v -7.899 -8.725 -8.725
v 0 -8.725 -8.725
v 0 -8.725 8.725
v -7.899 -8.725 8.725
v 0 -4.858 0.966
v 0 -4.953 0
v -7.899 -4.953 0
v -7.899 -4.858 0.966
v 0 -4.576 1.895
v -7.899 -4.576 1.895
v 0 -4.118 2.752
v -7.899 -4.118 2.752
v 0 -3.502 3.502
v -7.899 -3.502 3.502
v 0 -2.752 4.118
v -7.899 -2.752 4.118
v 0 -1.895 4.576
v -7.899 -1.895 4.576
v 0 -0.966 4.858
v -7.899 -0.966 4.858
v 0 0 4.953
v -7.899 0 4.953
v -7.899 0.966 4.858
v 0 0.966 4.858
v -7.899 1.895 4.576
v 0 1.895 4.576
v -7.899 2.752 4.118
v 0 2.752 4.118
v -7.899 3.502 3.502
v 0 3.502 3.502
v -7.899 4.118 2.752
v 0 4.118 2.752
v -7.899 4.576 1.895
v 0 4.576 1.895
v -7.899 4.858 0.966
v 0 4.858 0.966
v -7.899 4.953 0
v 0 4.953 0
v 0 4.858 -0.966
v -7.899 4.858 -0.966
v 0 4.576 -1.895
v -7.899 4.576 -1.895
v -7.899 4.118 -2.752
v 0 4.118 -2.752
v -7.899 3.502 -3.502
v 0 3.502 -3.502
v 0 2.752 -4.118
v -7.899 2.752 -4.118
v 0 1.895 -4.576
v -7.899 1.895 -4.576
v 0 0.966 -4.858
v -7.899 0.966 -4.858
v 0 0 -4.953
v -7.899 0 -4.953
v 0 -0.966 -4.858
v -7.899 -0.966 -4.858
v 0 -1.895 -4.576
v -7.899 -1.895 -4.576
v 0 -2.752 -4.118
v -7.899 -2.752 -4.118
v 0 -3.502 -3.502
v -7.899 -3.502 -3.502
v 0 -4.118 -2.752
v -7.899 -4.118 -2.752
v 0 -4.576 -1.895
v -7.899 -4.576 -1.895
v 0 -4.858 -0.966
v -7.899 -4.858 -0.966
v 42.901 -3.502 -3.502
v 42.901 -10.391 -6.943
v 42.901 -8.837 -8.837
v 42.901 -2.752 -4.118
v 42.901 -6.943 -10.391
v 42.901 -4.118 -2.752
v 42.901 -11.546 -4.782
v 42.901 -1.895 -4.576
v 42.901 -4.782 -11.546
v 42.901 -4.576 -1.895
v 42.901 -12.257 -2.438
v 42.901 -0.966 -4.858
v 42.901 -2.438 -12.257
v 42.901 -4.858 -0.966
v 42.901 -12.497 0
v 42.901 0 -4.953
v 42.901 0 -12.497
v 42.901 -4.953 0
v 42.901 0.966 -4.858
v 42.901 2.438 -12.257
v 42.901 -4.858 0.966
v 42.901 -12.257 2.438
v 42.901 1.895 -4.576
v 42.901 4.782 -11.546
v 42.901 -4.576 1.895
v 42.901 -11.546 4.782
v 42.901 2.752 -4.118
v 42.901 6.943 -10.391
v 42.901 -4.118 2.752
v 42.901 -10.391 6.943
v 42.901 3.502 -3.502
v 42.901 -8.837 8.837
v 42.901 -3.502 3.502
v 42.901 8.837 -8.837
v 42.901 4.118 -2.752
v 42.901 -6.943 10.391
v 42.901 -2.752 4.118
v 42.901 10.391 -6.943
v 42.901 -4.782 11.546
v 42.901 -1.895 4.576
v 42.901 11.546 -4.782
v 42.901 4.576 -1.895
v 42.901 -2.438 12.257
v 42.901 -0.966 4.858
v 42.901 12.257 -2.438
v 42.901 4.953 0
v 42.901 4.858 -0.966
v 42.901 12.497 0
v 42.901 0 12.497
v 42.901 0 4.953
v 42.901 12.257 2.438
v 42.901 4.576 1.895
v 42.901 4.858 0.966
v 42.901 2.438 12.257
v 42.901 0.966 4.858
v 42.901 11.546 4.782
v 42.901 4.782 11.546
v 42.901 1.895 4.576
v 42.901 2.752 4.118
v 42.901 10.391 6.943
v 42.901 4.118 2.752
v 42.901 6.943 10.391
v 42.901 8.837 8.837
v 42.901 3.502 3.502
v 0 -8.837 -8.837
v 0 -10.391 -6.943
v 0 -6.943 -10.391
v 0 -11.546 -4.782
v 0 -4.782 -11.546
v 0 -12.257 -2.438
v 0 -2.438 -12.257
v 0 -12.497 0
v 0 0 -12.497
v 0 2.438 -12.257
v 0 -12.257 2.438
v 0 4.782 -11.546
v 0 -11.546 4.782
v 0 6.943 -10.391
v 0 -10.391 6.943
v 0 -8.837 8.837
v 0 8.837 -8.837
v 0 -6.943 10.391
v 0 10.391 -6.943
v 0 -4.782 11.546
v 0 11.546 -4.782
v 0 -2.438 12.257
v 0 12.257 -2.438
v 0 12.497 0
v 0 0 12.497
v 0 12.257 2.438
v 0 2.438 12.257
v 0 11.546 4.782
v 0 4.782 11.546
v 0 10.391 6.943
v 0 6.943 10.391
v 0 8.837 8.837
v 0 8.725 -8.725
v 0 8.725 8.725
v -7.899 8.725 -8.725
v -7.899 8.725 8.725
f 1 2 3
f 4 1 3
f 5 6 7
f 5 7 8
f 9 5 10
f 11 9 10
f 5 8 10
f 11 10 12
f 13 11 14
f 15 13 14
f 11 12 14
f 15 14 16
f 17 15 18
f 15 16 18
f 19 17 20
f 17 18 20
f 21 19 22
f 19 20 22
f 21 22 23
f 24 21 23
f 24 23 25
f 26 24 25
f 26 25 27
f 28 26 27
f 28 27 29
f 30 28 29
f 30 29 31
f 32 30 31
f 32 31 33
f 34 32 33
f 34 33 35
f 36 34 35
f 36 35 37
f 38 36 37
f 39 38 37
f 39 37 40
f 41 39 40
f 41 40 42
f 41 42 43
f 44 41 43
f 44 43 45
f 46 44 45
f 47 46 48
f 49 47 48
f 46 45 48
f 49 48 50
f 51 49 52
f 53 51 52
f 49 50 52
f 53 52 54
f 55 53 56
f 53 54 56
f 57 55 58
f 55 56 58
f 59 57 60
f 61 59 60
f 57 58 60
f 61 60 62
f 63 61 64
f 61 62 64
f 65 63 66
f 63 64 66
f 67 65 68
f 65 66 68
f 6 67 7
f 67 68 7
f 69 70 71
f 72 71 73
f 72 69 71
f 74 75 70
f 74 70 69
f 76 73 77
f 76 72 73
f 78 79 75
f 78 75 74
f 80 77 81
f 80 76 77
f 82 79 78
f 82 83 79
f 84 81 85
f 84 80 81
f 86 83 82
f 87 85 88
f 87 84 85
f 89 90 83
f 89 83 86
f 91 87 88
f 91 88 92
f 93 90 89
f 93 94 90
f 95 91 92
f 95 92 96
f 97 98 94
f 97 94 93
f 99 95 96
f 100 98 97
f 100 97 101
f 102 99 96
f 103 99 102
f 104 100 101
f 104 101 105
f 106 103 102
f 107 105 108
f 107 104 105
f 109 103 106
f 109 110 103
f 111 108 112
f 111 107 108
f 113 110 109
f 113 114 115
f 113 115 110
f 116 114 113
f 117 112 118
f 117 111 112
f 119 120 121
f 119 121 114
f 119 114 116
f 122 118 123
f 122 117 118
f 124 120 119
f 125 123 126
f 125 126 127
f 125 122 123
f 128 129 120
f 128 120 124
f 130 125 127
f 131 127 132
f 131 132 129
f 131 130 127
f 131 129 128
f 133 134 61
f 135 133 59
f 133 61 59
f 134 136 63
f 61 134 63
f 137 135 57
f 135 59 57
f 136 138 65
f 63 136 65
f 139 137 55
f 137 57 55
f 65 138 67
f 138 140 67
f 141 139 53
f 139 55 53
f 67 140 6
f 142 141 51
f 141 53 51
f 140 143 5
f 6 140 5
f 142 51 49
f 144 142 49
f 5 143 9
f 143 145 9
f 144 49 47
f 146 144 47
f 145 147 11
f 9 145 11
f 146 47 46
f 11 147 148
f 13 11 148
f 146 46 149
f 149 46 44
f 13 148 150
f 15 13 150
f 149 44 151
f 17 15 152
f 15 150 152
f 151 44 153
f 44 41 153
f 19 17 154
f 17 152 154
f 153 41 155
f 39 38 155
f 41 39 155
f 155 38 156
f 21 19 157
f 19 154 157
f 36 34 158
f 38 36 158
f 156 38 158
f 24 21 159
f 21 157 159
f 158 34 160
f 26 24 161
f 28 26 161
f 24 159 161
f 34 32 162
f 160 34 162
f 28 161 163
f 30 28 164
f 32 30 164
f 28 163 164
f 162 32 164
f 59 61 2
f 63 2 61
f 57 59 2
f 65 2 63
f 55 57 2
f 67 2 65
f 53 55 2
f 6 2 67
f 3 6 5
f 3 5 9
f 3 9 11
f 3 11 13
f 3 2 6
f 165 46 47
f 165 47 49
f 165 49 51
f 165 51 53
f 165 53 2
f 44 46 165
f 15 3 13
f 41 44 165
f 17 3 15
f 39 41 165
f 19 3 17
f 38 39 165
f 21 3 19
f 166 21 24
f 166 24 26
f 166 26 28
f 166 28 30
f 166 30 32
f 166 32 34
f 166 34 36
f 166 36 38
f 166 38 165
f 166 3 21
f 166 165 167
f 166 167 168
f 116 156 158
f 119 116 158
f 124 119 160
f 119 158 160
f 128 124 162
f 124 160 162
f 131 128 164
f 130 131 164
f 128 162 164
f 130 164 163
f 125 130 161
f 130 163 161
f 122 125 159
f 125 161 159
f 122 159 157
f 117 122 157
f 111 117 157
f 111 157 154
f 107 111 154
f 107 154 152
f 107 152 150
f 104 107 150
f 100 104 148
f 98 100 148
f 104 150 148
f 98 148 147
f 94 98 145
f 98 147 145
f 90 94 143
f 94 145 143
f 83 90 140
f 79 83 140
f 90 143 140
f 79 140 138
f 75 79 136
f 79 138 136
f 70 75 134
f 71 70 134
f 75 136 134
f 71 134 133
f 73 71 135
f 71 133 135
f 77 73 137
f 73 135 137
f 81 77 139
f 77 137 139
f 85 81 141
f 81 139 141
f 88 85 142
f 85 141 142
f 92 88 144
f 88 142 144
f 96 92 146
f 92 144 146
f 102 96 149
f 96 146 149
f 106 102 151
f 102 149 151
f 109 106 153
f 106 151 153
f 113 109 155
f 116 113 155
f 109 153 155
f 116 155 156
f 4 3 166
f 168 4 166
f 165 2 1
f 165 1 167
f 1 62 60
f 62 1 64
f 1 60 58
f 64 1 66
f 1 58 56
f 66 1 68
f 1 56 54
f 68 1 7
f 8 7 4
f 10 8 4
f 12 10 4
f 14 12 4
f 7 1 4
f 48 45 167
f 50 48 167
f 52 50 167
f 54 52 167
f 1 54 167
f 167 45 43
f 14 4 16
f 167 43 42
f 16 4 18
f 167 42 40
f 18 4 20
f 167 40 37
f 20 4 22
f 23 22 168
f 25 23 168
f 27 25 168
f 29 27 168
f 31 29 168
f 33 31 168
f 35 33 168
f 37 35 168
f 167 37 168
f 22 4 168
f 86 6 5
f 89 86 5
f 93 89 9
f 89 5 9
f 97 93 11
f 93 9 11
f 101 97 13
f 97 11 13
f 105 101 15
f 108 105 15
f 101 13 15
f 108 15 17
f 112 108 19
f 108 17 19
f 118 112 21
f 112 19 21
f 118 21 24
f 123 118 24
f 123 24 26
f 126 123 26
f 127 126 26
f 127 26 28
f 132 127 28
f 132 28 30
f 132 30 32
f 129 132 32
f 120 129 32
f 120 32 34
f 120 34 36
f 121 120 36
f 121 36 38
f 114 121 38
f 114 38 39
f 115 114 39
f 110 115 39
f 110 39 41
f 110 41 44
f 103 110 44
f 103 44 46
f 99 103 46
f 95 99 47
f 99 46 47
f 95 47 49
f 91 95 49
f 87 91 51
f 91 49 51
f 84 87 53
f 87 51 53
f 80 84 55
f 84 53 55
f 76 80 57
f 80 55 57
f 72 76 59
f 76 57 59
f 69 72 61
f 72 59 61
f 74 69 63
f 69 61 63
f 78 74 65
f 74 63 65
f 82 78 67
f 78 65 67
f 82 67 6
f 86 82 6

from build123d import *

# Parameters (mm, degrees)
F0_W     = 17.4498
F0_H     = 17.4498
F1_DEPTH = 7.8994
F0_R     = 12.4968
F2_DEPTH = 42.9006
F3_R     = 4.953
F4_DEPTH = 50.8


with BuildPart() as f1:
    # F0 (on Right) → F1 (new body)
    with BuildSketch(Plane.YZ):
        Rectangle(F0_W, F0_H)
    extrude(amount=-F1_DEPTH)


with BuildPart() as f2:
    # F0 (on Right) → F2 (new body)
    with BuildSketch(Plane.YZ):
        Circle(F0_R)
        Rectangle(F0_W, F0_H, mode=Mode.SUBTRACT)
        Rectangle(F0_W, F0_H)
    extrude(amount=F2_DEPTH)


with BuildPart() as f4_tool:
    # F3 (on face) → F4 (new body)
    with BuildSketch(Plane(origin=(-7.8994, 0, 0), x_dir=(0, -1, 0), z_dir=(-1, 0, 0))):
        Circle(F3_R)
    extrude(amount=-F4_DEPTH)


with BuildPart() as f1_1:
    add(f1.part)

    # F4: cut by f4_tool
    add(f4_tool.part, mode=Mode.SUBTRACT)


with BuildPart() as f2_1:
    add(f2.part)

    # F4: cut by f4_tool
    add(f4_tool.part, mode=Mode.SUBTRACT)


solid = Compound([f1_1.part, f2_1.part])
